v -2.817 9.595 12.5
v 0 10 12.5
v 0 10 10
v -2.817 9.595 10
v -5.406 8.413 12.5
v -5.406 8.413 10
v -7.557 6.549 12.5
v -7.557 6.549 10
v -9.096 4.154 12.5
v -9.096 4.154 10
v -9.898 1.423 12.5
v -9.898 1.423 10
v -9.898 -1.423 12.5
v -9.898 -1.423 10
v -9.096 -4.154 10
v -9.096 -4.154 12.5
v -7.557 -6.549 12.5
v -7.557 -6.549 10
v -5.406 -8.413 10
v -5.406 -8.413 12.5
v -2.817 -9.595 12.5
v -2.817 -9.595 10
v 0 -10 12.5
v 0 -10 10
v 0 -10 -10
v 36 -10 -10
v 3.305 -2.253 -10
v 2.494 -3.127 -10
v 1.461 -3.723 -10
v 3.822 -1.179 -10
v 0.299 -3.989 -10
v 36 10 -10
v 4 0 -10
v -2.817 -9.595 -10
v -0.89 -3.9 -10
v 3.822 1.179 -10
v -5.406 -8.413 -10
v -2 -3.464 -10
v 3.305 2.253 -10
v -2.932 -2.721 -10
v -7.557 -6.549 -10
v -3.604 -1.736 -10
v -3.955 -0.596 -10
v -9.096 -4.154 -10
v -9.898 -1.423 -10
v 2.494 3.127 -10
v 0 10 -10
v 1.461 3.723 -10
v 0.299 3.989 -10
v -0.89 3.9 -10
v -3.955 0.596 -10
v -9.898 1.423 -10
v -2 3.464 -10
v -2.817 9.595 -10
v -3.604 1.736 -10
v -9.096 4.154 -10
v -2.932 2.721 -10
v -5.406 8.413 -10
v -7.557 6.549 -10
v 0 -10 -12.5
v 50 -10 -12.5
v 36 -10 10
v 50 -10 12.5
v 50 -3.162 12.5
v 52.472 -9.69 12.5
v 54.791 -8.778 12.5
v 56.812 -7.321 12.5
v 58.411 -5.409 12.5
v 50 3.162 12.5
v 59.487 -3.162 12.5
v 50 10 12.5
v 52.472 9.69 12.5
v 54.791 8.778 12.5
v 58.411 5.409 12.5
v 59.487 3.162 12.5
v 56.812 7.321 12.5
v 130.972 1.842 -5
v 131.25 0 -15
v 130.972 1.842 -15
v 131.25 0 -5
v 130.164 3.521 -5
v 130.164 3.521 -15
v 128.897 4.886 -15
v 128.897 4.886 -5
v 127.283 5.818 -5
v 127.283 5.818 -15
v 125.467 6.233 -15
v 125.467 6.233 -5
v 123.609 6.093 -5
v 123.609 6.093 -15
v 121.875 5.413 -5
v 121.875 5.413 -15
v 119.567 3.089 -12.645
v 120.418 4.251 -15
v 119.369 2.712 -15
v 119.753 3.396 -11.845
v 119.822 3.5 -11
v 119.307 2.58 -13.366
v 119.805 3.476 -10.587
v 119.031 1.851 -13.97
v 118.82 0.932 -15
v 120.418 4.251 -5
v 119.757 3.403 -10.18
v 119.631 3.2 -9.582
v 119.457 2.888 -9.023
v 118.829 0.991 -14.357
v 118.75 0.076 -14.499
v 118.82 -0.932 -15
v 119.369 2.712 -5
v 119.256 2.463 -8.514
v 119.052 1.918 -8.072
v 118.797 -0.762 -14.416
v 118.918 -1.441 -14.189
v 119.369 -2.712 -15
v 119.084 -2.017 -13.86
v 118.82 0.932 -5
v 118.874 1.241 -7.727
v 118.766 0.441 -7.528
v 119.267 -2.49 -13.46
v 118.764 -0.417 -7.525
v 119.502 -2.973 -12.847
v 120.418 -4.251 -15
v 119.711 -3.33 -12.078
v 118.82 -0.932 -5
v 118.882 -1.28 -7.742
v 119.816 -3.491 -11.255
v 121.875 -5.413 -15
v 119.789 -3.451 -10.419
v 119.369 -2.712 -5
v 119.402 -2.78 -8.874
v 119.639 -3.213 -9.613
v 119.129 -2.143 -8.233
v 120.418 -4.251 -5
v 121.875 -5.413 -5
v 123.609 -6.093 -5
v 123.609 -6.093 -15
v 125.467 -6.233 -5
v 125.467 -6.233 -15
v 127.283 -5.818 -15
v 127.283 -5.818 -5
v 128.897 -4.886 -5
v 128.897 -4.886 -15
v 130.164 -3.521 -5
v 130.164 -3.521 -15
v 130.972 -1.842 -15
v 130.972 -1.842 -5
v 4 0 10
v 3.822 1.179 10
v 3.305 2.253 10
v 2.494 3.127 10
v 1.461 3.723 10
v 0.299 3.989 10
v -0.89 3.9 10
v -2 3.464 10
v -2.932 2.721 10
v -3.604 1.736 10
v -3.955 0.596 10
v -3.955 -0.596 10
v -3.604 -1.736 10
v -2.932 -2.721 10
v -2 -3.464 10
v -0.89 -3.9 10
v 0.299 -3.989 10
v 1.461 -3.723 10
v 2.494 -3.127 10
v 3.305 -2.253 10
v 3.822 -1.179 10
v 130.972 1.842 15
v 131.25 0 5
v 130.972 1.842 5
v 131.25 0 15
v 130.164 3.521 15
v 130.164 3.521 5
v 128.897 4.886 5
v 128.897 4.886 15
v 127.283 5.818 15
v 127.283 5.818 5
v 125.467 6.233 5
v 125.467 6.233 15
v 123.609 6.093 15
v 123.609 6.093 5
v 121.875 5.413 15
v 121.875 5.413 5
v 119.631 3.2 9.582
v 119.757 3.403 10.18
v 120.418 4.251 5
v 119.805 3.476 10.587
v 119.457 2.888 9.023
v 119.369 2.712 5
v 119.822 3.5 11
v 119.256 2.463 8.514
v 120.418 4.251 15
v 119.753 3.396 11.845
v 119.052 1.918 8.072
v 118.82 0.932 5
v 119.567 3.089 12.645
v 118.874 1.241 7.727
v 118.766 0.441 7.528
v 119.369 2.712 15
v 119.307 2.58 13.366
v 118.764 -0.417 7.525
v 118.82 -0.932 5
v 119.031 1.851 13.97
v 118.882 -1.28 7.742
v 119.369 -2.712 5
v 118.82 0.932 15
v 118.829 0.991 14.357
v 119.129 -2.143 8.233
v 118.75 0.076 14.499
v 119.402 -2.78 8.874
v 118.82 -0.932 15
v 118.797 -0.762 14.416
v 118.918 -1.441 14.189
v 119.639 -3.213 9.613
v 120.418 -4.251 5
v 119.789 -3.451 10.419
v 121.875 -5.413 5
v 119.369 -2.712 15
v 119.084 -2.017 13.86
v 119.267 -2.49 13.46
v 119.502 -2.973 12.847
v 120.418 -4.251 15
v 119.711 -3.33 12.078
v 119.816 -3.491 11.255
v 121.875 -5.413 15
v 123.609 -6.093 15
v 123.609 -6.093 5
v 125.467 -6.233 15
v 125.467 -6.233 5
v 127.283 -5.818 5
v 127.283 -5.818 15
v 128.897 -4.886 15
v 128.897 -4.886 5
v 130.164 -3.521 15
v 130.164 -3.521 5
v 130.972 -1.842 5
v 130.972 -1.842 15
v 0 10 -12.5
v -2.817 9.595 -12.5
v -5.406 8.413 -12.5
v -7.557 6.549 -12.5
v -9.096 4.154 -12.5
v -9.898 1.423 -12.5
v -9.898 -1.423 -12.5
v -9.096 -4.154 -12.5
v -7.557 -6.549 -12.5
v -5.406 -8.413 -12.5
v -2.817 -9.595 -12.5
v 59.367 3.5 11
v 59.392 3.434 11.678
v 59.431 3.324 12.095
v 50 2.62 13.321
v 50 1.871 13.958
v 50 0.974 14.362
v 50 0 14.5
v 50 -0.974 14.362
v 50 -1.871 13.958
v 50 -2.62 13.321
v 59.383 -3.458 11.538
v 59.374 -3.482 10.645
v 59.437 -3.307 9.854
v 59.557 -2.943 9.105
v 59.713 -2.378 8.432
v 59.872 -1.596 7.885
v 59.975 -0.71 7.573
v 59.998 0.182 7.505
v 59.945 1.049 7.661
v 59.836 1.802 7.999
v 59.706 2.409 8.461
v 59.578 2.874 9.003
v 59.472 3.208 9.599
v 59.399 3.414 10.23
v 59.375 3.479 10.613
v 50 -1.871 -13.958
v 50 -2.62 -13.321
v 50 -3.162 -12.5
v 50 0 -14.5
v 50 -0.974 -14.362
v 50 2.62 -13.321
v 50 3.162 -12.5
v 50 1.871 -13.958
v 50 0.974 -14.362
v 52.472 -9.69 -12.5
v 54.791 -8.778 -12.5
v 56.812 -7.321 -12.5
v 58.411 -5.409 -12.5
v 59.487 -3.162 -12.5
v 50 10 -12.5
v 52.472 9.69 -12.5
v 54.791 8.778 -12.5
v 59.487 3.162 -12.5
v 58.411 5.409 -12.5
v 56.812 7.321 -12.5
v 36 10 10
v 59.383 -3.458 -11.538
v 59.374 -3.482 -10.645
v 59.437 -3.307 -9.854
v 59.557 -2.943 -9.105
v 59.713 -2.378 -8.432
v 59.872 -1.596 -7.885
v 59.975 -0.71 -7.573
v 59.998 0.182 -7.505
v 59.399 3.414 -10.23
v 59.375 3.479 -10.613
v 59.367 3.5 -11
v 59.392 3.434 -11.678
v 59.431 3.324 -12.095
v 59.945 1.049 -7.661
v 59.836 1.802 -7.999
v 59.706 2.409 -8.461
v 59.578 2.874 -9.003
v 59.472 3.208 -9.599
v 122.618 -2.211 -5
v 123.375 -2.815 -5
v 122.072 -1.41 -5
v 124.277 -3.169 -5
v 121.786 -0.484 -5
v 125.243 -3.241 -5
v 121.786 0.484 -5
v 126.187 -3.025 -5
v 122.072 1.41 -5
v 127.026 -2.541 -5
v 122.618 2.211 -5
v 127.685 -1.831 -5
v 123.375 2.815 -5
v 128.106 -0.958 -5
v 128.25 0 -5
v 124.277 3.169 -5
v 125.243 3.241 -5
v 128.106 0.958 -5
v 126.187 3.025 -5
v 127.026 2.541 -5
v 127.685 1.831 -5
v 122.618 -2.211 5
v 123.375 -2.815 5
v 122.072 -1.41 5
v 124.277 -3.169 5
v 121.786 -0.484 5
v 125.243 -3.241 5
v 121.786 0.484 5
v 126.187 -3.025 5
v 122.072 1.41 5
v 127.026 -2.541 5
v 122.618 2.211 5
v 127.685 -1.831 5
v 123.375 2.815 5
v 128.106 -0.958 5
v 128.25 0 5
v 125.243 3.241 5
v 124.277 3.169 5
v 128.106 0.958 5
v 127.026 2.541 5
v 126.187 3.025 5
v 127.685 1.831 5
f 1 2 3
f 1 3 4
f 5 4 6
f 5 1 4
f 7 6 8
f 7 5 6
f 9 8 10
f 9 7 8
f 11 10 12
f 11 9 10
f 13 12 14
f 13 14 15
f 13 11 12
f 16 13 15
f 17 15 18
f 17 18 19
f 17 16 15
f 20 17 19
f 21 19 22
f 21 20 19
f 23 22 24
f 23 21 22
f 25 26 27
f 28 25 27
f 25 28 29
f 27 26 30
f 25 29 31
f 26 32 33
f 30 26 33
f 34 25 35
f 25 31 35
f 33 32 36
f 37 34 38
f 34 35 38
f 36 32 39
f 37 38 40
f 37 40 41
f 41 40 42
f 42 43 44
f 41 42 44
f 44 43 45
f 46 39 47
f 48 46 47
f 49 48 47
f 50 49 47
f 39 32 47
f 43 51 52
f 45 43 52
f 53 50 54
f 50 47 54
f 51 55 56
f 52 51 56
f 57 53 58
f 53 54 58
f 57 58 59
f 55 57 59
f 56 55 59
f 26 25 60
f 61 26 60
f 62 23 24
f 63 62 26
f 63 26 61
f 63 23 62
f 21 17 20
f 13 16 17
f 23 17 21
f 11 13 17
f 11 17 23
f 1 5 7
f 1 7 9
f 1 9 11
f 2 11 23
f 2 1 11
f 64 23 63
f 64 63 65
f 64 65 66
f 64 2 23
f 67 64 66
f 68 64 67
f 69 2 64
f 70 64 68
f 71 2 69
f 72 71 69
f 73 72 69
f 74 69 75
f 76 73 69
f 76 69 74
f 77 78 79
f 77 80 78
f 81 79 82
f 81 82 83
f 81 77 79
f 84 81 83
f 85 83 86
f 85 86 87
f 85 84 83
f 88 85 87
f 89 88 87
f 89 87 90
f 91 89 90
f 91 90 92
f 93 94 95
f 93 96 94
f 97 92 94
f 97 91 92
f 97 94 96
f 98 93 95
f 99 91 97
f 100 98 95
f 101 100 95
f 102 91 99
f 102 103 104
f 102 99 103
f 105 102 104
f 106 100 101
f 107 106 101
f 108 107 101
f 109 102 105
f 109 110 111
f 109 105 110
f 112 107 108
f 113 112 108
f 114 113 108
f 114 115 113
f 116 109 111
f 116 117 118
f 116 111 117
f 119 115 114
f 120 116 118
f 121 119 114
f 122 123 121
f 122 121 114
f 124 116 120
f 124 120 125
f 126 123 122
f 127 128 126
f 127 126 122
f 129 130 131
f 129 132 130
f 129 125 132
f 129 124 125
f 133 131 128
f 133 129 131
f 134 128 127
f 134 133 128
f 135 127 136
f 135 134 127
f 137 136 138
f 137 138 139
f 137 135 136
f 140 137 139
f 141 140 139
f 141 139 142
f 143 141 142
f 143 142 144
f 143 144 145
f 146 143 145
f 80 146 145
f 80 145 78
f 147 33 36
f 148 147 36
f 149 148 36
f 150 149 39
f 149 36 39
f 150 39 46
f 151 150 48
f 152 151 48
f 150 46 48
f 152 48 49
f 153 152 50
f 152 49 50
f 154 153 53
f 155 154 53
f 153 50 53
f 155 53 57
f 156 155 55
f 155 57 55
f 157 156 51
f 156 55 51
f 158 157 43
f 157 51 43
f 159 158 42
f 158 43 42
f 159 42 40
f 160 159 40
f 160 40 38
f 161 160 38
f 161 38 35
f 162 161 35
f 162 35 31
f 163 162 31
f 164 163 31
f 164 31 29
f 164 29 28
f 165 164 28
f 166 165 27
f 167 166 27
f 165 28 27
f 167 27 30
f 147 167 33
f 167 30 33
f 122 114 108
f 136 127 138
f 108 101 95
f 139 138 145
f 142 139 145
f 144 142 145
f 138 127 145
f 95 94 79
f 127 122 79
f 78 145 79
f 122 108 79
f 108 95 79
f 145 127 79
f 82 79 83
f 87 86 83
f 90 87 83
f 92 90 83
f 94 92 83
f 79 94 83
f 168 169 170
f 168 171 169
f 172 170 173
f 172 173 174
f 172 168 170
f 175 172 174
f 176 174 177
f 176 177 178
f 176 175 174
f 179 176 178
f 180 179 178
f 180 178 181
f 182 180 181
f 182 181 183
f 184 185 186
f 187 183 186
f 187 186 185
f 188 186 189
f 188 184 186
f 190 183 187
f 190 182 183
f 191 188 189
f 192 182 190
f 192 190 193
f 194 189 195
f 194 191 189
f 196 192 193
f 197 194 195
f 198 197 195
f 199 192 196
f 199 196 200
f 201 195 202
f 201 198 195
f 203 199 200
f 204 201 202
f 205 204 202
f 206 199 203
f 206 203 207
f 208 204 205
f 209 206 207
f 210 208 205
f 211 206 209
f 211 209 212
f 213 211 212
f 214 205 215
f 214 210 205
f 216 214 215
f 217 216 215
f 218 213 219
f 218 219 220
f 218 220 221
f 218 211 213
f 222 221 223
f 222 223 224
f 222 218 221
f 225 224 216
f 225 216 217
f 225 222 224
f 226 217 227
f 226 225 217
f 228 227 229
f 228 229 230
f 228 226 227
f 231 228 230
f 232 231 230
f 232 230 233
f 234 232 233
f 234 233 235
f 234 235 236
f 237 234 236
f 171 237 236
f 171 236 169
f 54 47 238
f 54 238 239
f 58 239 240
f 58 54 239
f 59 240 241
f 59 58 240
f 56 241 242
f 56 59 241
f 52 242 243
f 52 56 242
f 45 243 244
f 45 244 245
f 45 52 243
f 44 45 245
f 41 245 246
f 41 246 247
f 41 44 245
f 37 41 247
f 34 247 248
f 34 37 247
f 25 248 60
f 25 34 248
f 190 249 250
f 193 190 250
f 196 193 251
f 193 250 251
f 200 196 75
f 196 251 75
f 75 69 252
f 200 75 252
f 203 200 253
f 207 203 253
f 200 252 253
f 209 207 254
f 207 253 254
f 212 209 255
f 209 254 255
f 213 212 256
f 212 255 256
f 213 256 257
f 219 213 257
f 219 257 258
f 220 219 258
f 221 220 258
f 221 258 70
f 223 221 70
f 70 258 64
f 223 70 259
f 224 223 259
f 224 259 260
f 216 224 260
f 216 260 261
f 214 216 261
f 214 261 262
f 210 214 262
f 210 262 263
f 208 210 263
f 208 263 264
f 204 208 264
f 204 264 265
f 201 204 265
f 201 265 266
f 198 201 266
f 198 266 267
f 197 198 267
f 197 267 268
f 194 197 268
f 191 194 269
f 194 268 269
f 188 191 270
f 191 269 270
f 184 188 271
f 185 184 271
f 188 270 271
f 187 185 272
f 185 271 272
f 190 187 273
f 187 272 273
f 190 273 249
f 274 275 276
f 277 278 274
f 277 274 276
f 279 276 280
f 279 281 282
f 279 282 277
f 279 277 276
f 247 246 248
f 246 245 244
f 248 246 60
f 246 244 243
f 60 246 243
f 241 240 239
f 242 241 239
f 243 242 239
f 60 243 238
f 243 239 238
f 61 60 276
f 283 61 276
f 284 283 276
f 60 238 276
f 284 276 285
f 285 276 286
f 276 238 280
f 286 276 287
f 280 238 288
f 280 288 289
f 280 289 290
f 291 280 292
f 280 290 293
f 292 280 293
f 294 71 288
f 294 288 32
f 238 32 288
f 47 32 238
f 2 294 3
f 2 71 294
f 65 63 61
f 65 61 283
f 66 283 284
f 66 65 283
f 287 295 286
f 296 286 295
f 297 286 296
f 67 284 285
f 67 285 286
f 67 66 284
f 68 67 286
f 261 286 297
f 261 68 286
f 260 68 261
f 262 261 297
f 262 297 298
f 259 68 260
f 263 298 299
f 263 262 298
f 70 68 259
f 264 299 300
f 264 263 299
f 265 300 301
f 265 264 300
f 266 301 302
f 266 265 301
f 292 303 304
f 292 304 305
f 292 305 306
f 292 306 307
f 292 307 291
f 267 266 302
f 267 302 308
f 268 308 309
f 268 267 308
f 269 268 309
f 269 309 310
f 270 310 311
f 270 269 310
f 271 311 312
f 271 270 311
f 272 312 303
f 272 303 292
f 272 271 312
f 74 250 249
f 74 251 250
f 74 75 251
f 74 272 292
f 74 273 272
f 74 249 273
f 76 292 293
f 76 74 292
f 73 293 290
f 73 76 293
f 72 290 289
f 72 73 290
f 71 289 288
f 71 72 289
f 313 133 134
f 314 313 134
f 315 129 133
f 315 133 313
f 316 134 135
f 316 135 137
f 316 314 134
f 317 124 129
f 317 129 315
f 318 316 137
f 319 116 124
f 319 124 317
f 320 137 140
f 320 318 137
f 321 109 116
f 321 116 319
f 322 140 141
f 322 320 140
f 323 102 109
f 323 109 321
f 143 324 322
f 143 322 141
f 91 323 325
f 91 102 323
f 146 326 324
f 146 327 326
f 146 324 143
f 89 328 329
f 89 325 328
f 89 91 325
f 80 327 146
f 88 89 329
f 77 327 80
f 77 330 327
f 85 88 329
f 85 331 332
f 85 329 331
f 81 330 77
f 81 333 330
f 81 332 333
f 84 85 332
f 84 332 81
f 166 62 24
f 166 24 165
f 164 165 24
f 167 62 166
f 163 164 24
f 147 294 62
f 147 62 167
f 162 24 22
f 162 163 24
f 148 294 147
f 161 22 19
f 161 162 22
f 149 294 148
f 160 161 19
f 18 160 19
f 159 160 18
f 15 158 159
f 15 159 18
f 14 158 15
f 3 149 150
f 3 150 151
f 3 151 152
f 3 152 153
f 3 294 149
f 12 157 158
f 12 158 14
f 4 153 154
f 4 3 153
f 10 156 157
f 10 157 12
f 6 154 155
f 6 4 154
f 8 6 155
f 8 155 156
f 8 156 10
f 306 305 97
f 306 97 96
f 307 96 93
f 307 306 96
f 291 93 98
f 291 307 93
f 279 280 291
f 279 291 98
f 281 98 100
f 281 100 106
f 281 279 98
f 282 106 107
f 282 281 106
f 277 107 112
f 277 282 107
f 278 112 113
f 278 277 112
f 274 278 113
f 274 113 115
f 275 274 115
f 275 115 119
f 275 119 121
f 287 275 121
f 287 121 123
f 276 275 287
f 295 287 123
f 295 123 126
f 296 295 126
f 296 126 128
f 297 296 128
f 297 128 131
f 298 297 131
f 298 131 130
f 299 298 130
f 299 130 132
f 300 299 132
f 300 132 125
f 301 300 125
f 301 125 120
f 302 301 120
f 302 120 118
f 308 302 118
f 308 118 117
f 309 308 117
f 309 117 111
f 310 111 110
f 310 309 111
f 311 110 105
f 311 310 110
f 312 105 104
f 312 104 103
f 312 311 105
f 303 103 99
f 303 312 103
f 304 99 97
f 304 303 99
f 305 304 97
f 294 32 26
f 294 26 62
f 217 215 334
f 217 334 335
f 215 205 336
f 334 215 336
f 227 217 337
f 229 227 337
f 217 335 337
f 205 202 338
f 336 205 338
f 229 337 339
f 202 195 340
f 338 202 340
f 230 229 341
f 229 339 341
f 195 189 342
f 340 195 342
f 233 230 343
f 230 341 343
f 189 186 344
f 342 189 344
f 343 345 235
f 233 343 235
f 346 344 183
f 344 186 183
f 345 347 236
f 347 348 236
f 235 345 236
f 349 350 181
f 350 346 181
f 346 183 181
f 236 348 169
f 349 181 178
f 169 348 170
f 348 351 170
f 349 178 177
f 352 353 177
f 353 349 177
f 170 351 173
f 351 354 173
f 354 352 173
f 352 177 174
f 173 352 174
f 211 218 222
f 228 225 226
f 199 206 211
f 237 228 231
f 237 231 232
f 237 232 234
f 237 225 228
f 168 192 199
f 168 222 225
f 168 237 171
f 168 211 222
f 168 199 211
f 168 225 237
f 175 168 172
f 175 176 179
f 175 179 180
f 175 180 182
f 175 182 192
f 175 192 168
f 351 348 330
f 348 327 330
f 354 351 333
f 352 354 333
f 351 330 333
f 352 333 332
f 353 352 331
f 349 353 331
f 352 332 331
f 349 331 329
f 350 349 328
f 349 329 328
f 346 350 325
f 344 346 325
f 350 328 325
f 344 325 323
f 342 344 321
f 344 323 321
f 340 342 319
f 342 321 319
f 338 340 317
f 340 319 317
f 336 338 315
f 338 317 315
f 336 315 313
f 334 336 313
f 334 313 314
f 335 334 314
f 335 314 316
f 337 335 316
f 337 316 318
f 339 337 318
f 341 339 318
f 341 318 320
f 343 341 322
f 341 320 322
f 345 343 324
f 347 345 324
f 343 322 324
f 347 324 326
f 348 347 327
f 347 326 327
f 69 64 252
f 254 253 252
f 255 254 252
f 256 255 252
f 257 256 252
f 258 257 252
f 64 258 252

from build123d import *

# Parameters (mm, degrees)
EXTRUDE1_DEPTH     = 12.5
SKETCH2_W          = 50
SKETCH2_H          = 20
CUT_EXTRUDE1_DEPTH = 21
SKETCH3_R          = 3.5
EXTRUDE2_DEPTH     = 70
SKETCH4_R          = 6.25
EXTRUDE3_DEPTH     = 15
SKETCH7_R          = 6.25
SKETCH7_R_2        = 3.25
EXTRUDE6_DEPTH     = 5
SKETCH6_R          = 4
EXTRUDE5_DEPTH     = 20


with BuildPart() as part:
    # Sketch1 → Extrude1 (new body, symmetric)
    with BuildSketch(Plane.XY):
        with BuildLine():
            Line((50, 10), (0, 10))
            ThreePointArc((0, 10), (-10, 0), (0, -10))
            Line((0, -10), (50, -10))
            ThreePointArc((50, -10), (60, 0), (50, 10))
        make_face()
    extrude(amount=EXTRUDE1_DEPTH, both=True)

    # Sketch2 → Cut-Extrude1 (cut, through all)
    with BuildSketch(Plane(origin=(0, 10, 0), x_dir=(-1, 0, 0), z_dir=(0, 1, 0))):
        with Locations((-11, 0)):
            Rectangle(SKETCH2_W, SKETCH2_H)
    extrude(amount=-CUT_EXTRUDE1_DEPTH, mode=Mode.SUBTRACT)

    # Sketch3 → Extrude2 (add)
    with BuildSketch(Plane.YZ.offset(50)):
        with Locations((0, 11)):
            Circle(SKETCH3_R)
    extrude2 = extrude(amount=EXTRUDE2_DEPTH)

    # Mirror1: Extrude2 across plane
    add(extrude2.mirror(Plane.XY))

    # Sketch4 → Extrude3 (add, symmetric)
    with BuildSketch(Plane.XY):
        with Locations((125, 0)):
            Circle(SKETCH4_R)
    extrude(amount=EXTRUDE3_DEPTH, both=True)

    # Sketch7 → Extrude6 (cut, symmetric)
    with BuildSketch(Plane.XY):
        with Locations((125, 0)):
            Circle(SKETCH7_R)
        with Locations((125, 0)):
            Circle(SKETCH7_R_2, mode=Mode.SUBTRACT)
    extrude(amount=EXTRUDE6_DEPTH, both=True, mode=Mode.SUBTRACT)

    # Sketch6 → Extrude5 (add)
    with BuildSketch(Plane.XY.offset(-10)):
        Circle(SKETCH6_R)
    extrude(amount=EXTRUDE5_DEPTH)


solid = part.part
